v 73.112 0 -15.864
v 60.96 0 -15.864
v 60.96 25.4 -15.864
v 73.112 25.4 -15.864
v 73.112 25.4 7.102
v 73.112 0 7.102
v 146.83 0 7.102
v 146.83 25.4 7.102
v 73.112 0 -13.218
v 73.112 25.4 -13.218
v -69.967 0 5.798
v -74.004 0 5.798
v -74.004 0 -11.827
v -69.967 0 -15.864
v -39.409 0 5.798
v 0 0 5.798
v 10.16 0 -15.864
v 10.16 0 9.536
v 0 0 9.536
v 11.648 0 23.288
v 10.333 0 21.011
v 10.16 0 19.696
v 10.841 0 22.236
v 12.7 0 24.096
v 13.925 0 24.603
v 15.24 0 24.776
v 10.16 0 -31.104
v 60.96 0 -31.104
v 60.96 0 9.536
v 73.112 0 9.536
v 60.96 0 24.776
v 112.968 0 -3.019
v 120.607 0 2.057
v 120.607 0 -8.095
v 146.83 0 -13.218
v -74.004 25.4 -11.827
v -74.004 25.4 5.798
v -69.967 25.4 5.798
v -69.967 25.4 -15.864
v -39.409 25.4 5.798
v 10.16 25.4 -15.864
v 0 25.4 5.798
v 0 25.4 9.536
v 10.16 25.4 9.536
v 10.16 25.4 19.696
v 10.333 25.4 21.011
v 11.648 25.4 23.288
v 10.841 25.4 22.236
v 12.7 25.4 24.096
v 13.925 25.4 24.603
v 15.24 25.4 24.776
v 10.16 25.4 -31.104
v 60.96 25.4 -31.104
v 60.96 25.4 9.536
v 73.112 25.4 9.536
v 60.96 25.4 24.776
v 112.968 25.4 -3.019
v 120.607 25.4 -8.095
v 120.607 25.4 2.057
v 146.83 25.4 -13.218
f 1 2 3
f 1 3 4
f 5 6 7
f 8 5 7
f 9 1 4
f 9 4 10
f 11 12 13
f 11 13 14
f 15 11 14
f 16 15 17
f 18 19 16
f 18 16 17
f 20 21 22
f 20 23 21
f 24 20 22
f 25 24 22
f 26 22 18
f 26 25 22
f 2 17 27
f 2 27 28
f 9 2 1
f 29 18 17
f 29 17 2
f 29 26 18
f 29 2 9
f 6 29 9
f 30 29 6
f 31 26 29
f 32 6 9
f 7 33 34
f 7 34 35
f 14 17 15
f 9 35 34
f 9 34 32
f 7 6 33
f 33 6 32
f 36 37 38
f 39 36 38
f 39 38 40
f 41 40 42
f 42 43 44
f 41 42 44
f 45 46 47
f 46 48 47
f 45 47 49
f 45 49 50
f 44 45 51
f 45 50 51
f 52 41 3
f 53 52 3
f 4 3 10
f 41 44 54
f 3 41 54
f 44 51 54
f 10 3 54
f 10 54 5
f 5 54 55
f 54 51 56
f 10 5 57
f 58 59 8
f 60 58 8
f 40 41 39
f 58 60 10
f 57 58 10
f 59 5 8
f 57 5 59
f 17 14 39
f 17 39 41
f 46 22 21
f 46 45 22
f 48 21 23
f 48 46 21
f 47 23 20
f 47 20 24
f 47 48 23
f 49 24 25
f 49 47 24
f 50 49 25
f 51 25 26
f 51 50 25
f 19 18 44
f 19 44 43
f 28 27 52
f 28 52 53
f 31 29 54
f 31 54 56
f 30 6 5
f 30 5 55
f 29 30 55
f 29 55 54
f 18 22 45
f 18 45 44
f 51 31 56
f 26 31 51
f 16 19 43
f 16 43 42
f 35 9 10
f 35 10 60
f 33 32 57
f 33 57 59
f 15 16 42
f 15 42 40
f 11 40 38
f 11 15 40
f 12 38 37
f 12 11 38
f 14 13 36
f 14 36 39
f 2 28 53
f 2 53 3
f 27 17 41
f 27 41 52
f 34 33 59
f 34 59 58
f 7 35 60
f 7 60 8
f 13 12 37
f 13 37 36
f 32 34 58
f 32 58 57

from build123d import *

# Parameters (mm, degrees)
F0_W     = 18.5124866861
F0_H     = 21.6614069645
F0_W_2   = 12.0454215246
F0_W_3   = 73.7178325796
F0_H_2   = 20.32
F1_DEPTH = 25.399999693
F2_R     = 5.08


with BuildPart() as f1:
    # F0 (on Front) → F1 (new body)
    with BuildSketch(Plane.XZ):
        with Locations((-60.7111408332, -5.0329225945)):
            Rectangle(F0_W, F0_H)
        Polygon((-74.0043607078, -11.8266495452), (-69.9673841763, -15.8636260767), (-69.9673841763, 5.7977808877), (-74.0043607078, 5.7977808877), align=None)
        with Locations((-45.4321867279, -5.0329225945)):
            Rectangle(F0_W_2, F0_H)
        Polygon((-39.4094759656, 5.7977808877), (-39.4094759656, -15.8636260767), (10.16, -15.8636260767), (10.16, 9.5363739233), (0, 9.5363739233), (0, 5.7977808877), align=None)
        Polygon((10.16, 9.5363739233), (10.16, -15.8636260767), (10.16, -31.1036260767), (20.1555099338, -31.1036260767), (20.1555099338, -15.7277081162), (31.0831721872, -15.5134415254), (31.0831721872, 9.3416357413), (19.0822575136, 9.3416357413), (19.0822575136, 24.7763739233), (10.16, 24.7763739233), align=None)
        Polygon((20.1555099338, -15.7277081162), (20.1555099338, -31.1036260767), (51.8696520655, -31.1036260767), (51.8696520655, -15.7424807711), (42.6536388695, -15.7424807711), (42.6536388695, 9.1273672879), (51.652893424, 9.3416357413), (51.652893424, 24.7763739233), (19.0822575136, 24.7763739233), (19.0822575136, 9.3416357413), (31.0831721872, 9.3416357413), (31.0831721872, -15.5134415254), align=None)
        Polygon((51.8696520655, -15.7424807711), (51.8696520655, -31.1036260767), (60.96, -31.1036260767), (60.96, -15.8636260767), (60.96, 9.5363739233), (60.96, 24.7763739233), (51.652893424, 24.7763739233), (51.652893424, 9.3416357413), (42.6536388695, 9.1273672879), (42.6536388695, -15.7424807711), align=None)
        Polygon((60.96, 9.5363739233), (60.96, -15.8636260767), (73.1124170143, -15.8636260767), (73.1124170143, -13.2178157567), (73.1124170143, 7.1021842433), (73.1124170143, 9.5363739233), align=None)
        with Locations((109.971333304, -3.0578157567)):
            Rectangle(F0_W_3, F0_H_2)
        Polygon((112.9683130925, -3.0190604849), (120.6068721646, 2.0565357327), (120.6068721646, -8.0946567025), align=None, mode=Mode.SUBTRACT)
    extrude(amount=-F1_DEPTH)

    # F2
    f2_edges = [f1.edges().sort_by_distance(p)[0] for p in [
        (10.16, 12.7, 24.776374),
    ]]
    fillet(f2_edges, radius=F2_R)


solid = f1.part
